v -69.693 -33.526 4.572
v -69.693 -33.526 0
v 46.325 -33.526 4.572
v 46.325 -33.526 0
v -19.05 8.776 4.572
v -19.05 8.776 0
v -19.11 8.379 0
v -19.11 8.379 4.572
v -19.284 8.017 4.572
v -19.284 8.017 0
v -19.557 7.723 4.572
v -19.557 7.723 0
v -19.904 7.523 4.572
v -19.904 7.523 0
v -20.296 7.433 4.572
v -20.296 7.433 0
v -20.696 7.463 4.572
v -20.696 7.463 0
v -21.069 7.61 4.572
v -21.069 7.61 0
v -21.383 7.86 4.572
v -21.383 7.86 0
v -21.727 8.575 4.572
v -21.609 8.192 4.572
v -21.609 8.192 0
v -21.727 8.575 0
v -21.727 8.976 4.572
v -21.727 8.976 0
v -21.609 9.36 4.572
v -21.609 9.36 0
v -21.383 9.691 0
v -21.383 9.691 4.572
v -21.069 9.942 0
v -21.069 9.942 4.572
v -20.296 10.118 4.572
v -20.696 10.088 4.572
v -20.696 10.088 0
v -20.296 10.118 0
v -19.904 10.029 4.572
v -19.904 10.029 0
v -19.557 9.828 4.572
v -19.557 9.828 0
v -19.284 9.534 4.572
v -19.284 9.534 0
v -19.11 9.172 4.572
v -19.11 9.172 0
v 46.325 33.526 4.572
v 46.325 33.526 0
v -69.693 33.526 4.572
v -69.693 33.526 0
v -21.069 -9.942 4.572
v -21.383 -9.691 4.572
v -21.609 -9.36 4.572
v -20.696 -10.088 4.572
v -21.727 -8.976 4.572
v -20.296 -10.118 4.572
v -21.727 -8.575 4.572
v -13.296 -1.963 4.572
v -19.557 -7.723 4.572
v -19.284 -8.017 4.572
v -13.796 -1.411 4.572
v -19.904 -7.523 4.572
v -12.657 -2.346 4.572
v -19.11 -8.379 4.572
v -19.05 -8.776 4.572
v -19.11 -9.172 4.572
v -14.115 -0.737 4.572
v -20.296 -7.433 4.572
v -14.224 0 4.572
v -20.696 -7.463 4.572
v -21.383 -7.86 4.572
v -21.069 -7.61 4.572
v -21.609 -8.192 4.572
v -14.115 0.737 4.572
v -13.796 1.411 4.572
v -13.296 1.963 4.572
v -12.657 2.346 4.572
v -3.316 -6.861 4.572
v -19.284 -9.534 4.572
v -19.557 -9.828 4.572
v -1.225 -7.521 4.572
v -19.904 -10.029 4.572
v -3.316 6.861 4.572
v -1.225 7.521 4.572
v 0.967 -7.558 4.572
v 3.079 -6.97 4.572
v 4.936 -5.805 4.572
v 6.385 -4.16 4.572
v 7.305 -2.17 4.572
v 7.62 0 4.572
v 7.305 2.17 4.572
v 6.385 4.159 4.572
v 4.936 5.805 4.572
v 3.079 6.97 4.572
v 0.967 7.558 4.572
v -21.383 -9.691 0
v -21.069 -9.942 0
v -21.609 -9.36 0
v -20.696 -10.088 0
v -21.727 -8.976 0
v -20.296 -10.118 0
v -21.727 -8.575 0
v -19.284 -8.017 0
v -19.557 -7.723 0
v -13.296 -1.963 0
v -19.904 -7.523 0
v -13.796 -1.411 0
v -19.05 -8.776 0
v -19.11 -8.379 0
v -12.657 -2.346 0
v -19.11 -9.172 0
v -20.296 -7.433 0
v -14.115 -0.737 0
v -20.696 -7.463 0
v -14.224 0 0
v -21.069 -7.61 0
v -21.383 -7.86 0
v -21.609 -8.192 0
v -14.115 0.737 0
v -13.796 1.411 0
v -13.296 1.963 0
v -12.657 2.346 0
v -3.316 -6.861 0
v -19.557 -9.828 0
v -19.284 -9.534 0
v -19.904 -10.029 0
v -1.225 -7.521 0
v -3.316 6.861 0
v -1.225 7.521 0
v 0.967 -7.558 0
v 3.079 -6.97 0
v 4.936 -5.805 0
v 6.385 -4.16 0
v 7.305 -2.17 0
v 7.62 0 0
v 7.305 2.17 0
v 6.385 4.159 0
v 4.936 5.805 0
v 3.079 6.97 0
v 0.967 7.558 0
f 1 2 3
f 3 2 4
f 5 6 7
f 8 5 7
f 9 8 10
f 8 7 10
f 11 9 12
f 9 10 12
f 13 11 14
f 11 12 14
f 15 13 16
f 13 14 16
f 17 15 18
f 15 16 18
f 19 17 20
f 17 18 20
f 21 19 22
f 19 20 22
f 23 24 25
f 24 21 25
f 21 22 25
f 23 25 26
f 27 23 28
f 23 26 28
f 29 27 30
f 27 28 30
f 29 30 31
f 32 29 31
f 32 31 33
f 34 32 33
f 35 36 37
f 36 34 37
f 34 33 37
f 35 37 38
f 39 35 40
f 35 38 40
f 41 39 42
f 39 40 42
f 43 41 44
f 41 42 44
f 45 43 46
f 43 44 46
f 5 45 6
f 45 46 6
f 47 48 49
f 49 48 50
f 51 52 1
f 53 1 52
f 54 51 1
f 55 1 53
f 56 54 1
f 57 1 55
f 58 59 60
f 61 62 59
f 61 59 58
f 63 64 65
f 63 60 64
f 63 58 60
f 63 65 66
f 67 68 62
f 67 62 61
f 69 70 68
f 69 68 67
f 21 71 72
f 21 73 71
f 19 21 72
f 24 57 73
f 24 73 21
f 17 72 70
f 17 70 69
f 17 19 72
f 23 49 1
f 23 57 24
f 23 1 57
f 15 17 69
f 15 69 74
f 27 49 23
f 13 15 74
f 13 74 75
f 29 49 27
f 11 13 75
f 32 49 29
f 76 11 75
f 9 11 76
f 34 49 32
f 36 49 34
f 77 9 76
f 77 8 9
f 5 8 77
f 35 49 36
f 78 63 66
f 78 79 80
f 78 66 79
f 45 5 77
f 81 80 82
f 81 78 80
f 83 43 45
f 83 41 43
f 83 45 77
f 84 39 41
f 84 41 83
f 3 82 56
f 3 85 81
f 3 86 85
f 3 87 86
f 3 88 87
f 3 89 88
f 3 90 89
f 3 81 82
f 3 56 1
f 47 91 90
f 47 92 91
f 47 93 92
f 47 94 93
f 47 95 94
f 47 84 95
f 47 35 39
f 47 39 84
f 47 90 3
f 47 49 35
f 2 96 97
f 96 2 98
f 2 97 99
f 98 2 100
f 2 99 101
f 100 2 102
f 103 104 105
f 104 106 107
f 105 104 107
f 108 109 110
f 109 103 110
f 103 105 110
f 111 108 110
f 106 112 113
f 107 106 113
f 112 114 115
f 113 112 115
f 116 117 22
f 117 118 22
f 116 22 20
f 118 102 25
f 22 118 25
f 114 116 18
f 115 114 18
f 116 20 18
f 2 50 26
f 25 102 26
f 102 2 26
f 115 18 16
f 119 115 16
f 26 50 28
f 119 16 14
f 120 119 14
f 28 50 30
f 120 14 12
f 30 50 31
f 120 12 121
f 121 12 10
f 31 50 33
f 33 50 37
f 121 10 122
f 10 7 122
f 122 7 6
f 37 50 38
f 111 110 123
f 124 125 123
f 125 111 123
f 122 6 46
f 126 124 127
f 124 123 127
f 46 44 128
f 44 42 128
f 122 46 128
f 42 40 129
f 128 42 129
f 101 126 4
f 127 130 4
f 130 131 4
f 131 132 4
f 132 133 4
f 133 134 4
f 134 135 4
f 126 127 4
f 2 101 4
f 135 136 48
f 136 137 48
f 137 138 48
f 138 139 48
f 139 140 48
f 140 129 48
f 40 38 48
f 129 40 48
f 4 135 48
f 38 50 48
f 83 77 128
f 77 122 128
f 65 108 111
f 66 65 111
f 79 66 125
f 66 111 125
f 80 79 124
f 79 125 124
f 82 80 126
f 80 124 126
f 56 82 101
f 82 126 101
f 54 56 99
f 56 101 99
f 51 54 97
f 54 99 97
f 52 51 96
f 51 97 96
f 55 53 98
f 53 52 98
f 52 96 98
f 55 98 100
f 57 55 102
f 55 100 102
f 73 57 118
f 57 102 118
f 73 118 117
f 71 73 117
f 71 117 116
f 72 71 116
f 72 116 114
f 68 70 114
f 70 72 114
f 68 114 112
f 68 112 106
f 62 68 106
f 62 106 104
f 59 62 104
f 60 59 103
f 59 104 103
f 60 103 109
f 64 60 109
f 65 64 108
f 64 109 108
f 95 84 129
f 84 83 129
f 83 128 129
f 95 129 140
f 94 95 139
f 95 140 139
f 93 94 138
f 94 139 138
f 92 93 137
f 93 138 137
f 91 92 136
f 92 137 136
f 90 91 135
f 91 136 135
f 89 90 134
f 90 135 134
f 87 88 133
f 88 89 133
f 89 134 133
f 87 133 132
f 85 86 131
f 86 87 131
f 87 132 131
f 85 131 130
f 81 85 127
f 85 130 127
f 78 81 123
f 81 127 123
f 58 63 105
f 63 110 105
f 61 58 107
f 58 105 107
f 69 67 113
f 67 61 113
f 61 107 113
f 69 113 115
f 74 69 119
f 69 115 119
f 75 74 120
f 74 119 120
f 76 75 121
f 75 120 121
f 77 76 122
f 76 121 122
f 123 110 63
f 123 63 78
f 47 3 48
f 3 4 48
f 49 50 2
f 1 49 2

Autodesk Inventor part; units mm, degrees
ref_plane "YZ Plane" through (0, 0, 0) normal (1, 0, 0) x (0, 1, 0)
ref_plane "XZ Plane" through (0, 0, 0) normal (0, 1, 0) x (-1, 0, 0)
ref_plane "XY Plane" through (0, 0, 0) normal (0, 0, 1) x (1, 0, 0)
sketch "Sketch1" plane through (0, 0, 0) normal (0, 0, 1) x (1, 0, 0)
  circle A0 centre (0, 0) radius 6.35 construction
  line L0 (0, 6.35) -> (-19.05, 6.35) construction
  circle A1 centre (-11.684, 0) radius 1.905 construction
  line L1 (-11.684, 0) -> (-19.05, 0) construction
  line L2 (-19.05, 0) -> (-20.3962, 0) construction
  line L3 (-20.3962, 0) -> (-20.3962, 7.4295) construction
  line L4 (-20.3962, 0) -> (-20.3962, -7.4295) construction
  line L5 (-20.3962, 7.4295) -> (-20.3962, 8.7757) construction
  circle A2 centre (-20.3962, 8.7757) radius 1.3462
  line L6 (-20.3962, -7.4295) -> (-20.3962, -8.7757) construction
  circle A3 centre (-20.3962, -8.7757) radius 1.3462
  arc A4 (-3.3157, -6.8608) -> (-4.2121, 6.35) centre (0, 0) ccw
  arc A5 (-12.6572, 2.3462) -> (-12.6572, -2.3462) centre (-11.684, 0) ccw
  line L7 (-12.6572, 2.3462) -> (-3.3157, 6.8608)
  line L8 (-12.6572, -2.3462) -> (-3.3157, -6.8608)
  line L9 (-69.6934, -33.5262) -> (46.3254, -33.5262)
  line L10 (46.3254, -33.5262) -> (46.3254, 33.5262)
  line L11 (46.3254, 33.5262) -> (-69.6934, 33.5262)
  line L12 (-69.6934, 33.5262) -> (-69.6934, -33.5262)
  dimension "d7" = 12.7
  dimension "d8" = 19.05
  dimension "d11" = 3.429
  dimension "d12" = 3.81
  dimension "d13" = 1.3462
  dimension "d14" = 7.4295
  dimension "d15" = 7.4295
  dimension "d16" = 1.3462
  dimension "d17" = 1.3462
  dimension "d18" = 15.24
  dimension "d19" = 5.08
extrude "Extrusion1" add sketch "Sketch1" along normal blind 4.572
properties part number "MOTORTOP"
